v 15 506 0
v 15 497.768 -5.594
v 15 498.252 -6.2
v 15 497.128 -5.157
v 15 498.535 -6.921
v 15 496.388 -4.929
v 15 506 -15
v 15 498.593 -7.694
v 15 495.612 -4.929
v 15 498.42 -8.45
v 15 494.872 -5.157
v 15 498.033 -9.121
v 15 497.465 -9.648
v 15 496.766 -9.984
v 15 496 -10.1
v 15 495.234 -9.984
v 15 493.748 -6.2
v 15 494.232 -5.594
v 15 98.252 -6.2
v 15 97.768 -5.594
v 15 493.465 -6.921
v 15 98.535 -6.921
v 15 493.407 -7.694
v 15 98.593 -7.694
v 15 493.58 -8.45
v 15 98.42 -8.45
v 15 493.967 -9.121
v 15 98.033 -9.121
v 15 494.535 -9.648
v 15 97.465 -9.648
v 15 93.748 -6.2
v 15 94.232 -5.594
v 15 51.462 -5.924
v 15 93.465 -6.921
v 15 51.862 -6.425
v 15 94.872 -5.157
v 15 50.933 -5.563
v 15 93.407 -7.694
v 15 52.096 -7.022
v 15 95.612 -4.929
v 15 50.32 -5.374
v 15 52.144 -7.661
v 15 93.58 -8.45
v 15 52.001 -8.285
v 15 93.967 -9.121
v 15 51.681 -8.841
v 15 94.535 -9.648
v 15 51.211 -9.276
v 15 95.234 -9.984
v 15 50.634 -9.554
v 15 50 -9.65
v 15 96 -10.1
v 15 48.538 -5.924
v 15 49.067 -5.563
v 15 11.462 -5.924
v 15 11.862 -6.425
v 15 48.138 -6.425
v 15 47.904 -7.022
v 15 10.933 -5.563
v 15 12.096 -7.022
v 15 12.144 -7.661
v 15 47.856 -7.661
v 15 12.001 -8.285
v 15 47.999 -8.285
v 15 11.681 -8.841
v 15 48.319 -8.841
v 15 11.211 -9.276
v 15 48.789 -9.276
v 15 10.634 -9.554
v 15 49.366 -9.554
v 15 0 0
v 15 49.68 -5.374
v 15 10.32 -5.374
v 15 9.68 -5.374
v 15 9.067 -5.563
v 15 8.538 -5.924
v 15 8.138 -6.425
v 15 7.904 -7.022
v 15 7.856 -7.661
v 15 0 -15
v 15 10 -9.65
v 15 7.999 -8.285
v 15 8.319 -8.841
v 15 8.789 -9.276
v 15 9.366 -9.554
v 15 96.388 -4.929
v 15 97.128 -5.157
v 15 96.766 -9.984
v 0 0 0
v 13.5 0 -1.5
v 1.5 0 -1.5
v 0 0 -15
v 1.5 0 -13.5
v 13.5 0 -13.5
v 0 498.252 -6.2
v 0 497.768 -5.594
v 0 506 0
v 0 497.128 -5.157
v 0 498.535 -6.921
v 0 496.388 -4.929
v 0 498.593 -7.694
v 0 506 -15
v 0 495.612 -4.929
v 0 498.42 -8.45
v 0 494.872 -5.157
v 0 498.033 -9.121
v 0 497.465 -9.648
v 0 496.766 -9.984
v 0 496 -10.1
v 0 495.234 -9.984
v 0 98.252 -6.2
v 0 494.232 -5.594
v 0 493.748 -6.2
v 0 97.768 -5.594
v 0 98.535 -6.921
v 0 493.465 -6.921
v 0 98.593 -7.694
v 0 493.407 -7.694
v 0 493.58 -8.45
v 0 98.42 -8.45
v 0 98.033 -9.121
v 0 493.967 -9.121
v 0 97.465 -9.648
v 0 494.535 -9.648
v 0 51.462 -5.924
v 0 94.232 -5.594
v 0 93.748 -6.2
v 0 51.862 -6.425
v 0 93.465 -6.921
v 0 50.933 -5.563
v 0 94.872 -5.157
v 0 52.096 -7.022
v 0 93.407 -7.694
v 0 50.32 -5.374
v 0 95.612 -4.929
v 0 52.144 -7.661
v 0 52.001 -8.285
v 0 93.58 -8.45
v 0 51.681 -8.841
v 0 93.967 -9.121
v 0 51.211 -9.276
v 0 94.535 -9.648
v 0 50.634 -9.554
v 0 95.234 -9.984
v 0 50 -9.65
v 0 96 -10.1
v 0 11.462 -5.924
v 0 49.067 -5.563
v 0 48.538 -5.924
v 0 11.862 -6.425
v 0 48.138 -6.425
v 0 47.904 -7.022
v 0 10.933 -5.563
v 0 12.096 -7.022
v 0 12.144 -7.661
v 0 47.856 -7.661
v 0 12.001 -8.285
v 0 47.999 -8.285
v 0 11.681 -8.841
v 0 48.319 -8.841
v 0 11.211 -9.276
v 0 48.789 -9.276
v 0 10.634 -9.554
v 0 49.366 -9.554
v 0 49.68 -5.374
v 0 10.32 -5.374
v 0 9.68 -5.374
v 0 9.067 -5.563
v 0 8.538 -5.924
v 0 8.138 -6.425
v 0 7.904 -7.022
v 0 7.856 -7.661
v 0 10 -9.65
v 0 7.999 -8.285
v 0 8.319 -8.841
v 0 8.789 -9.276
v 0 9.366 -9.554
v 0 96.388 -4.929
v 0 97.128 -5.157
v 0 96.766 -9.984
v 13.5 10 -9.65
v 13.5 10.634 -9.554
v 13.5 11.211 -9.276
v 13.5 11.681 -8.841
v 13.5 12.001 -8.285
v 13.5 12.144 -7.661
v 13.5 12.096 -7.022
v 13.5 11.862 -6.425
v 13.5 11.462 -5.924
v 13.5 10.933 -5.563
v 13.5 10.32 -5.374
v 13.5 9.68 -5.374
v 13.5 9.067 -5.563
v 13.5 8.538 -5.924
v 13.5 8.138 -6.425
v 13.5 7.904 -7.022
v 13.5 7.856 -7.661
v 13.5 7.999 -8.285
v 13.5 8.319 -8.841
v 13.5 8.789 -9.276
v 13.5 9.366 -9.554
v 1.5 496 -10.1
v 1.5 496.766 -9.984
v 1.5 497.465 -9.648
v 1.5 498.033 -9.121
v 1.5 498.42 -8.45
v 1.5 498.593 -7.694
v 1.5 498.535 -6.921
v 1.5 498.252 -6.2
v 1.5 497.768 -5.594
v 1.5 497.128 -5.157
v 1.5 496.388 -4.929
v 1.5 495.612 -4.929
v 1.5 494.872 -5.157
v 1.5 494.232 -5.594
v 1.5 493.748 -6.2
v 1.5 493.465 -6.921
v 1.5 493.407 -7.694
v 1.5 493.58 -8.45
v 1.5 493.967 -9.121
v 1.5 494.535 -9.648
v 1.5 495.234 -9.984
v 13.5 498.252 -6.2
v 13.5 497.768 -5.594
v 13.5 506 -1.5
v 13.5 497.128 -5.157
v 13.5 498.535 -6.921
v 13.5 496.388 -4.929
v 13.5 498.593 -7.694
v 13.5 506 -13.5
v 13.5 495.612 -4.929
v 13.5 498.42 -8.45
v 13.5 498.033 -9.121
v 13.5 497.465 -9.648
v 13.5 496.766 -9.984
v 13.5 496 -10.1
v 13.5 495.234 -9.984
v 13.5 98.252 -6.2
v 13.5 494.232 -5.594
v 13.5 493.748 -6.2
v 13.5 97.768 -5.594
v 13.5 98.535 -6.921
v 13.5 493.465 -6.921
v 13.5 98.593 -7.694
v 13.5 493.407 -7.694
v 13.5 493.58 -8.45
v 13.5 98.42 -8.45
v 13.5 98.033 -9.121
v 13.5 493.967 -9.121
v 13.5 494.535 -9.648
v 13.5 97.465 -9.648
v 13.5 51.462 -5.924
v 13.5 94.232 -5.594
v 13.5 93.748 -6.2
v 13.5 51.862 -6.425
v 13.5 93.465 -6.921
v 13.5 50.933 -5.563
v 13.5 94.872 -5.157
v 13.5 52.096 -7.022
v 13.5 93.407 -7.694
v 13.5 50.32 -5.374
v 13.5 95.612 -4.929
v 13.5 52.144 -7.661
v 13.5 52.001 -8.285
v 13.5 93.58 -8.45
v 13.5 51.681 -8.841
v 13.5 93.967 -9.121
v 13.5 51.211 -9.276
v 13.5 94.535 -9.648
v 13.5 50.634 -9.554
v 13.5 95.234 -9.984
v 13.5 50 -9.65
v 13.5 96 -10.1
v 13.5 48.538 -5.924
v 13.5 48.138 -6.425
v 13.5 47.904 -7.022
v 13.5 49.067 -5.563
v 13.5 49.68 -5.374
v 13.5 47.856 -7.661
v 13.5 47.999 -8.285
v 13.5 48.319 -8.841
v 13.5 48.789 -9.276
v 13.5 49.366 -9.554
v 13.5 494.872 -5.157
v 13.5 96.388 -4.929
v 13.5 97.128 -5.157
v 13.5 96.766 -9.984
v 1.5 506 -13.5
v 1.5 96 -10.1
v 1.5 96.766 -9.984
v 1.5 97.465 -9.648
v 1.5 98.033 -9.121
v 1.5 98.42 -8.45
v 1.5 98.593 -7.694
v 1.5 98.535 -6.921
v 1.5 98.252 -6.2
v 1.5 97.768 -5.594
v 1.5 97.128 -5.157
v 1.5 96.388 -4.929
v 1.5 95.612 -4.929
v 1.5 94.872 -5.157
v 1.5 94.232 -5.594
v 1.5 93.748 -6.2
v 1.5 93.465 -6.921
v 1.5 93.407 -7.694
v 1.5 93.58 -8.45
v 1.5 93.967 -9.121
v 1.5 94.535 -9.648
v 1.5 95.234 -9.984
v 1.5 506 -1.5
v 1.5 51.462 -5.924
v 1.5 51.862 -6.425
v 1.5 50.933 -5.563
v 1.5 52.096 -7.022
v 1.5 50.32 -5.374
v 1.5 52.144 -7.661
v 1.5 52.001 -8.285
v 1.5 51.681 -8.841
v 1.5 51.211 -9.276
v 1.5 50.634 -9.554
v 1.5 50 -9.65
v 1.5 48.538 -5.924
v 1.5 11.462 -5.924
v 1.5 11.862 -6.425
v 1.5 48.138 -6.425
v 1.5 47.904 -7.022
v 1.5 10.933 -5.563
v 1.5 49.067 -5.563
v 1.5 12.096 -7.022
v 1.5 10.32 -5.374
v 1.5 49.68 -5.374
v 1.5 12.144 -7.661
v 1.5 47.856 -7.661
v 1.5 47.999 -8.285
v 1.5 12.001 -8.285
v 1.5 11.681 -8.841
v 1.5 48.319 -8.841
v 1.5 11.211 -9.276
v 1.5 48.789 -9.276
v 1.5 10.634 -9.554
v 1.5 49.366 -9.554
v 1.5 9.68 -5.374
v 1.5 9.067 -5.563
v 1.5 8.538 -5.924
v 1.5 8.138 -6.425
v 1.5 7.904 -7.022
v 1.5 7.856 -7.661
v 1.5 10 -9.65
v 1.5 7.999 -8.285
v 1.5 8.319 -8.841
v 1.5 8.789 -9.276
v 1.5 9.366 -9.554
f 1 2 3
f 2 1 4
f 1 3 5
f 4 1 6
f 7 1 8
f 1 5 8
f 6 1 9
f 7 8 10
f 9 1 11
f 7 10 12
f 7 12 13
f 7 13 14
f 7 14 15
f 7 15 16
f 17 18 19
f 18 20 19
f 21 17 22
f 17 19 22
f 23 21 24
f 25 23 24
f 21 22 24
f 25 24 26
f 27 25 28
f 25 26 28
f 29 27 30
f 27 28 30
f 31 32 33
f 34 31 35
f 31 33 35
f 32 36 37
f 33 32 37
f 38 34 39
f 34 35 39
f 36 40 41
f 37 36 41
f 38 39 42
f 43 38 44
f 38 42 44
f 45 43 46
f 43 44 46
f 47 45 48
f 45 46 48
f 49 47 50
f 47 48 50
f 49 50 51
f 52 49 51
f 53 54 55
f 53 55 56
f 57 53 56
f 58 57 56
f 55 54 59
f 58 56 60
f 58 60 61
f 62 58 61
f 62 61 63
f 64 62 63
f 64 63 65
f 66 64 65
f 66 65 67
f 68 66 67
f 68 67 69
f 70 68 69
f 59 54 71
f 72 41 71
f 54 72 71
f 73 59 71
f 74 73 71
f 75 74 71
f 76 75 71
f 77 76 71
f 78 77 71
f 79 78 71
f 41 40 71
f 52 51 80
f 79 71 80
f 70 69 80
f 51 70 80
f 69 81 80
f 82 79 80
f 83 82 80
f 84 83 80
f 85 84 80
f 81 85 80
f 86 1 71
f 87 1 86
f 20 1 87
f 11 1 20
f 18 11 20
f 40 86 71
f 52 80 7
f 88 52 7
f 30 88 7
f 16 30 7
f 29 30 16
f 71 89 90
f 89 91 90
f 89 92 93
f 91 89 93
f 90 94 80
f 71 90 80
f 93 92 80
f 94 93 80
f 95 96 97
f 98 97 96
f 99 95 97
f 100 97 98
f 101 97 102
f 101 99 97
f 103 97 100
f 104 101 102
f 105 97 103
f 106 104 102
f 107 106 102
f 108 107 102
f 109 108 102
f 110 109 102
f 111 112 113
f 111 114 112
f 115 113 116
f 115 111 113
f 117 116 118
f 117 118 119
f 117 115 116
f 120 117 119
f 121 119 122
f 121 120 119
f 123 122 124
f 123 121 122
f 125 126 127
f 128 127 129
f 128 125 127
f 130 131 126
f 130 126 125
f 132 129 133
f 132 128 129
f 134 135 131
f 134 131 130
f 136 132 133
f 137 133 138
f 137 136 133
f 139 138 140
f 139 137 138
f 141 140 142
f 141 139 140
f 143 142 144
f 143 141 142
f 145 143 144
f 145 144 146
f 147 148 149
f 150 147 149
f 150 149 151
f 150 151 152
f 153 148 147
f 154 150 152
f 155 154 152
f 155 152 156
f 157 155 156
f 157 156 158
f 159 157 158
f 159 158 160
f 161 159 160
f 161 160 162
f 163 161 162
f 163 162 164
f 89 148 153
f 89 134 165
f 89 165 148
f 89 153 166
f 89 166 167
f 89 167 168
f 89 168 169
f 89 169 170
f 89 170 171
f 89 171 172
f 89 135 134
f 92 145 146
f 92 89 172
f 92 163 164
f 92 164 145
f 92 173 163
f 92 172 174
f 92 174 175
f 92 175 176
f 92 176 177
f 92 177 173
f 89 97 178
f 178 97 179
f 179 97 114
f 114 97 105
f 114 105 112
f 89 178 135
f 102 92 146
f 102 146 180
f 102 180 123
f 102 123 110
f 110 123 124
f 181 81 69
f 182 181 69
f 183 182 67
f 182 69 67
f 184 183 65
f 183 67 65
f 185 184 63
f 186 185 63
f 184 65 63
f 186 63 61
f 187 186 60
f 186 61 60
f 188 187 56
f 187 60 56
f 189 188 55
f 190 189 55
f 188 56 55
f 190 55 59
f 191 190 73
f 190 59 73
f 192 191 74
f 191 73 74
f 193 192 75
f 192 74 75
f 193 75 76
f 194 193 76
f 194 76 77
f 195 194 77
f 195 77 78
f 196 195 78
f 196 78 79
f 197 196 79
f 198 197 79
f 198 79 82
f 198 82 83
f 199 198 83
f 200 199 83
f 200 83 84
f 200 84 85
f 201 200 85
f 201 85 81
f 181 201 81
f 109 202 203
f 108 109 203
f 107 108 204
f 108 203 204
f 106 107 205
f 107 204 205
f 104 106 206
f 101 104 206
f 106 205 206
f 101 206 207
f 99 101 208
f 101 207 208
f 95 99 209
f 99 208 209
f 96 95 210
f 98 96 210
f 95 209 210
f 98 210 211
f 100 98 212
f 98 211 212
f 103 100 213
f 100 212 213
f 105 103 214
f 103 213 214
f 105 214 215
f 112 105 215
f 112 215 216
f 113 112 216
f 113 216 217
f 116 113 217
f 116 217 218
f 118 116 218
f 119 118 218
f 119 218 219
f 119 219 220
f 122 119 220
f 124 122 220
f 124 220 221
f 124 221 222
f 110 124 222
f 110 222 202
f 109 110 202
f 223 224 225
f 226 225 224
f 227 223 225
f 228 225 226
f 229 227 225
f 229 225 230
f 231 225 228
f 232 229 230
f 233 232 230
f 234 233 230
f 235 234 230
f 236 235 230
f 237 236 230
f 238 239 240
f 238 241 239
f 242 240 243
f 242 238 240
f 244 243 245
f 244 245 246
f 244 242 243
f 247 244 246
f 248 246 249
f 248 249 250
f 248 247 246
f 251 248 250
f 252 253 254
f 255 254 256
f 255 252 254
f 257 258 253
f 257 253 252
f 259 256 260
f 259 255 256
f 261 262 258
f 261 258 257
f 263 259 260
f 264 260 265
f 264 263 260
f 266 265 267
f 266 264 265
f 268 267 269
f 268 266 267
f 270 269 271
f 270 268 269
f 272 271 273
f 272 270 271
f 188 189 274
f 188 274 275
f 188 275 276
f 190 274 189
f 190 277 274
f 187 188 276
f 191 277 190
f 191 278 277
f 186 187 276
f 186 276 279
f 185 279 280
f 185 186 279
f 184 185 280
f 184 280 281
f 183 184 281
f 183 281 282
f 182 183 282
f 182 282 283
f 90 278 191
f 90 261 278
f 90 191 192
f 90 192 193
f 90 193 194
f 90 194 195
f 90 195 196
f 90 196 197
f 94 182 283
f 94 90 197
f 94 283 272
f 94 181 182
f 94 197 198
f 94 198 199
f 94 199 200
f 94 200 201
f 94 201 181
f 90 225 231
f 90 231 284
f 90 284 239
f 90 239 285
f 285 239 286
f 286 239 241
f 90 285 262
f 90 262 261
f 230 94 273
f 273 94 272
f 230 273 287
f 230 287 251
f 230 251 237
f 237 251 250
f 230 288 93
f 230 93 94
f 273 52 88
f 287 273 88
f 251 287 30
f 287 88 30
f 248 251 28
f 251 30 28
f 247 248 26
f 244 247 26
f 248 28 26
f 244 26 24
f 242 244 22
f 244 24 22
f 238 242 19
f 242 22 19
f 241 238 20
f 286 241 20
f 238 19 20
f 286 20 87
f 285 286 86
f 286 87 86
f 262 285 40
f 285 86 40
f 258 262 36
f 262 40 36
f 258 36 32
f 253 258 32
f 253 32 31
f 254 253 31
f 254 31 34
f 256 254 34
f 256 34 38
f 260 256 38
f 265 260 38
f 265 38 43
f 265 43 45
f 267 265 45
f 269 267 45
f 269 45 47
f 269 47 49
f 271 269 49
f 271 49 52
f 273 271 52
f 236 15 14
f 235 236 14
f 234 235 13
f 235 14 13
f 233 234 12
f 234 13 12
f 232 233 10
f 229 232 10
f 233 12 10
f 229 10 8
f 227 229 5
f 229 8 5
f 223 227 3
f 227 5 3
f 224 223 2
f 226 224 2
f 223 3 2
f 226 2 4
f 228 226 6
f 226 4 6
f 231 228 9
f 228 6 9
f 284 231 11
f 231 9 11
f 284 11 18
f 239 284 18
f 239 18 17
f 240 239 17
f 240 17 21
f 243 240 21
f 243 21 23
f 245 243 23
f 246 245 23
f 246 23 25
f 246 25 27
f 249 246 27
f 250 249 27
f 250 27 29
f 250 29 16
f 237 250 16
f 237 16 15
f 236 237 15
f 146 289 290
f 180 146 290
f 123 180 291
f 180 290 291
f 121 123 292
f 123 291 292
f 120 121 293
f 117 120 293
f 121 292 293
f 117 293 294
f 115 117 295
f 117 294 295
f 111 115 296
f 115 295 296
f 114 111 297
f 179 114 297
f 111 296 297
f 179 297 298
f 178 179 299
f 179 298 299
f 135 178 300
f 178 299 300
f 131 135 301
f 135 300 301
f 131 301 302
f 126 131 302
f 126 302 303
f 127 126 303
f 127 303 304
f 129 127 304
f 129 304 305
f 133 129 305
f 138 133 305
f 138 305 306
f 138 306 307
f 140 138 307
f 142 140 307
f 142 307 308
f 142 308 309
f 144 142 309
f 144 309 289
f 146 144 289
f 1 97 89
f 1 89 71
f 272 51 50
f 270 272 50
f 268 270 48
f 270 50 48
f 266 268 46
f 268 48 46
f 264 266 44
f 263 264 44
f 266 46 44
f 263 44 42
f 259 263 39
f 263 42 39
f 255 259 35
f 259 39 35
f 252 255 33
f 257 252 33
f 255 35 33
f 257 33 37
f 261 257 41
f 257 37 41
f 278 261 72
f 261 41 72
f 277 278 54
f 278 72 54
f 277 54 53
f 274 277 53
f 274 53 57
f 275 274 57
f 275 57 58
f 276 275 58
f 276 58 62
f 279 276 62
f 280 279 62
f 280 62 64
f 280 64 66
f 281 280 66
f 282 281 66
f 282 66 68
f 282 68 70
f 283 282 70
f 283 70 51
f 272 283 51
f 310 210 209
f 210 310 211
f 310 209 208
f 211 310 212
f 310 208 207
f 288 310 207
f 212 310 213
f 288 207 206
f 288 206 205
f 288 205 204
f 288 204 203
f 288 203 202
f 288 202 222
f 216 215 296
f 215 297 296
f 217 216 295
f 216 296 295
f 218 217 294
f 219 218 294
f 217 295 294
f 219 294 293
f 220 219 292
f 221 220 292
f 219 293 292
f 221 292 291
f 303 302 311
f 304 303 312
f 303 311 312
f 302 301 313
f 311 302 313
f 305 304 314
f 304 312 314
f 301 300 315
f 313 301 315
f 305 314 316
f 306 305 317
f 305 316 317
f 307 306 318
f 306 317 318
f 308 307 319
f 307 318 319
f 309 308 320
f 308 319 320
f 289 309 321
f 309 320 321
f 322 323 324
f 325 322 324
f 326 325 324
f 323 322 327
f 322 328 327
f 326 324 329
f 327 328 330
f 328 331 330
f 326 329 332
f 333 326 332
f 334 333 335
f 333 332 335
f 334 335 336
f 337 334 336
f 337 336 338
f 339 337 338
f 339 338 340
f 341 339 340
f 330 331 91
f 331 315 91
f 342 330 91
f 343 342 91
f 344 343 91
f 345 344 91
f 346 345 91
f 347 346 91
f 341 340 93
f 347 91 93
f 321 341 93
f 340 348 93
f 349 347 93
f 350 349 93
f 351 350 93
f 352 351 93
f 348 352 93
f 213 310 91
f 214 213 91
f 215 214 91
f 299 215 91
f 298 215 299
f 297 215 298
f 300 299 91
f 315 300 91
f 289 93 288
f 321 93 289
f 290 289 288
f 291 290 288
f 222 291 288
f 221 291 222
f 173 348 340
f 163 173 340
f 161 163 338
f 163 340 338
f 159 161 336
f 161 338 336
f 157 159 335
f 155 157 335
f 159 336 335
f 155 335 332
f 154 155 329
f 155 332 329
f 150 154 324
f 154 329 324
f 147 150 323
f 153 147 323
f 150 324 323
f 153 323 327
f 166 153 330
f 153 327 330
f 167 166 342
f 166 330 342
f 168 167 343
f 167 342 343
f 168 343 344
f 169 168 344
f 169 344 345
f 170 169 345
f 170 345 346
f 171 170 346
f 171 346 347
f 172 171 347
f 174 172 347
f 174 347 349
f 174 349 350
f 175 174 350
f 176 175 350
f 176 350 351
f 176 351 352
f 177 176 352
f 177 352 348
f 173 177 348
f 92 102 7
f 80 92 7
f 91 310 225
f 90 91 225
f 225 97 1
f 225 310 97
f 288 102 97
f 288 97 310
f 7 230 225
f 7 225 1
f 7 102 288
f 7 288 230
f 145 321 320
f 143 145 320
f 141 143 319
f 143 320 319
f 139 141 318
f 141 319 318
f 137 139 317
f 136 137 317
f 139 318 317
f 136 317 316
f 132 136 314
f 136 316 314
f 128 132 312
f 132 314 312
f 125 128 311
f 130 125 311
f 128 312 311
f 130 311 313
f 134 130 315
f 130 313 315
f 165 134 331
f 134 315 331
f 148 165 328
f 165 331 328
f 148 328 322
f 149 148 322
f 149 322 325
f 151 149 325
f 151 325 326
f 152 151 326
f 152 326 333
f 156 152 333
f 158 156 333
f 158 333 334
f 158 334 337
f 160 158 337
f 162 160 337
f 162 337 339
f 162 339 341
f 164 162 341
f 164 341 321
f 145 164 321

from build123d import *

# Parameters (mm, degrees)
SKETCH_1_W          = 15
SKETCH_1_H          = 15
SKETCH_1_W_2        = 12
SKETCH_1_H_2        = 12
EXTRUDE_1_DEPTH     = 506
CUT_EXTRUDE_1_REACH = 508.444
SKETCH_2_R          = 2.6
SKETCH_2_R_2        = 2.15


with BuildPart() as part:
    # ｽｹｯﾁ1 → 押し出し-薄板1 (new body)
    with BuildSketch(Plane(origin=(0, 0, 0), x_dir=(1, 0, 0), z_dir=(0, 1, 0))):
        with Locations((7.5, 7.5)):
            Rectangle(SKETCH_1_W, SKETCH_1_H)
        with Locations((7.5, 7.5)):
            Rectangle(SKETCH_1_W_2, SKETCH_1_H_2, mode=Mode.SUBTRACT)
    extrude(amount=EXTRUDE_1_DEPTH)

    # ｶｯﾄ - 押し出し1: up to this face of the body (flat: up to its plane)
    cut_extrude_1_end = Plane(part.part.faces().sort_by_distance((0, 253, -7.5))[0])
    # ｽｹｯﾁ2 → ｶｯﾄ - 押し出し1 (cut, up to the picked face)
    with BuildSketch(Plane(origin=(15, 0, 0), x_dir=(0, 0, -1), z_dir=(1, 0, 0)), mode=Mode.PRIVATE) as cut_extrude_1_sk1:
        with Locations((7.5, 496)):
            Circle(SKETCH_2_R)
    cut_extrude_1_tool1 = split(extrude(cut_extrude_1_sk1.sketch, amount=-CUT_EXTRUDE_1_REACH, mode=Mode.PRIVATE), bisect_by=cut_extrude_1_end, keep=Keep.BOTH, mode=Mode.PRIVATE)
    # ｽｹｯﾁ2 → ｶｯﾄ - 押し出し1 (cut, up to the picked face)
    with BuildSketch(Plane(origin=(15, 0, 0), x_dir=(0, 0, -1), z_dir=(1, 0, 0)), mode=Mode.PRIVATE) as cut_extrude_1_sk2:
        with Locations((7.5, 10)):
            Circle(SKETCH_2_R_2)
    cut_extrude_1_tool2 = split(extrude(cut_extrude_1_sk2.sketch, amount=-CUT_EXTRUDE_1_REACH, mode=Mode.PRIVATE), bisect_by=cut_extrude_1_end, keep=Keep.BOTH, mode=Mode.PRIVATE)
    # ｽｹｯﾁ2 → ｶｯﾄ - 押し出し1 (cut, up to the picked face)
    with BuildSketch(Plane(origin=(15, 0, 0), x_dir=(0, 0, -1), z_dir=(1, 0, 0)), mode=Mode.PRIVATE) as cut_extrude_1_sk3:
        with Locations((7.5, 50)):
            Circle(SKETCH_2_R_2)
    cut_extrude_1_tool3 = split(extrude(cut_extrude_1_sk3.sketch, amount=-CUT_EXTRUDE_1_REACH, mode=Mode.PRIVATE), bisect_by=cut_extrude_1_end, keep=Keep.BOTH, mode=Mode.PRIVATE)
    # ｽｹｯﾁ2 → ｶｯﾄ - 押し出し1 (cut, up to the picked face)
    with BuildSketch(Plane(origin=(15, 0, 0), x_dir=(0, 0, -1), z_dir=(1, 0, 0)), mode=Mode.PRIVATE) as cut_extrude_1_sk4:
        with Locations((7.5, 96)):
            Circle(SKETCH_2_R)
    cut_extrude_1_tool4 = split(extrude(cut_extrude_1_sk4.sketch, amount=-CUT_EXTRUDE_1_REACH, mode=Mode.PRIVATE), bisect_by=cut_extrude_1_end, keep=Keep.BOTH, mode=Mode.PRIVATE)
    add(cut_extrude_1_tool1.solids().sort_by(Axis((15, 496, -7.5), (-1, 0, 0)))[0], mode=Mode.SUBTRACT)
    add(cut_extrude_1_tool2.solids().sort_by(Axis((15, 10, -7.5), (-1, 0, 0)))[0], mode=Mode.SUBTRACT)
    add(cut_extrude_1_tool3.solids().sort_by(Axis((15, 50, -7.5), (-1, 0, 0)))[0], mode=Mode.SUBTRACT)
    add(cut_extrude_1_tool4.solids().sort_by(Axis((15, 96, -7.5), (-1, 0, 0)))[0], mode=Mode.SUBTRACT)


solid = part.part
